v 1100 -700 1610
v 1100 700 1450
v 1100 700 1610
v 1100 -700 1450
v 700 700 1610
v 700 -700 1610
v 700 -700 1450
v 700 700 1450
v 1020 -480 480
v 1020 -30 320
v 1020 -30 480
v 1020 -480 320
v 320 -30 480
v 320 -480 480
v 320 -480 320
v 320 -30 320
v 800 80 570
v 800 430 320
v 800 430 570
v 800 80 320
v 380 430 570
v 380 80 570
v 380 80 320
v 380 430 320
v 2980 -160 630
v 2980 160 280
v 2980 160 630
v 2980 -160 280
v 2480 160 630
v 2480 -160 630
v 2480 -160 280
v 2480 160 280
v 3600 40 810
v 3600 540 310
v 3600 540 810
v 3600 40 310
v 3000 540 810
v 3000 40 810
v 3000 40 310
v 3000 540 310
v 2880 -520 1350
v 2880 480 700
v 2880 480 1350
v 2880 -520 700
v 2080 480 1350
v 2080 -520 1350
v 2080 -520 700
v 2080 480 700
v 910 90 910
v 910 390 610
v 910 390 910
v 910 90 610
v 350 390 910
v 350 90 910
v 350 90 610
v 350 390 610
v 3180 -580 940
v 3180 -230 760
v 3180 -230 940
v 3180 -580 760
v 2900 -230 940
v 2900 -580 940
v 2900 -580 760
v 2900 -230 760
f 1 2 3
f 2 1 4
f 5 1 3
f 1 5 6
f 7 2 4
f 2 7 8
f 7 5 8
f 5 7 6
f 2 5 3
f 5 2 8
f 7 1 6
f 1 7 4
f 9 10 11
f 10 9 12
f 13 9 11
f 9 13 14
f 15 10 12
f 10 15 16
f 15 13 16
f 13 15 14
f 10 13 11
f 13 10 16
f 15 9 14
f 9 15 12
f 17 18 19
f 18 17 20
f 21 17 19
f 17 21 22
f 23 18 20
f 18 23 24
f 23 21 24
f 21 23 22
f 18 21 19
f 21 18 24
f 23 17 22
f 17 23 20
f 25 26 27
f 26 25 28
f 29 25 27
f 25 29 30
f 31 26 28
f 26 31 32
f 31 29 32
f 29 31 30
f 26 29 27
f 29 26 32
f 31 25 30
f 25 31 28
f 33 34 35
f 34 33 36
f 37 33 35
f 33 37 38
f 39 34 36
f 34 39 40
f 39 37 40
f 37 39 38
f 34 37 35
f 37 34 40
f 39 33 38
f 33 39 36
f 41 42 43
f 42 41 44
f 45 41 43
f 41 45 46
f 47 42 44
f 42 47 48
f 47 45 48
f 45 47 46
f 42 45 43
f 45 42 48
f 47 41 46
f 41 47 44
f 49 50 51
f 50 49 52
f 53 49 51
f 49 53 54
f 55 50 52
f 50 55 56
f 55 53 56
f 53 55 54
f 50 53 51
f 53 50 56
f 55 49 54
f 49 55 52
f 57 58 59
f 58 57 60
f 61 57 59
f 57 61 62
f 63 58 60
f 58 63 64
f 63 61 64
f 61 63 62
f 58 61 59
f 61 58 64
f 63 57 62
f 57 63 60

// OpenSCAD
// Target alternative envelopes for ZAZ, NOT original VW geometry; mm.
color([0.2196078431372549, 0.7411764705882353, 0.9725490196078431]) translate([700, -700, 1450]) cube([400, 1400, 160]);
color([0.1450980392156863, 0.38823529411764707, 0.9215686274509803]) translate([320, -480, 320]) cube([700, 450, 160]);
color([0.6549019607843137, 0.5450980392156862, 0.9803921568627451]) translate([380, 80, 320]) cube([420, 350, 250]);
color([0.5803921568627451, 0.6392156862745098, 0.7215686274509804]) translate([2480, -160, 280]) cube([500, 320, 350]);
color([0.984313725490196, 0.5725490196078431, 0.23529411764705882]) translate([3000, 40, 310]) cube([600, 500, 500]);
color([0.9372549019607843, 0.26666666666666666, 0.26666666666666666]) translate([2080, -520, 700]) cube([800, 1000, 650]);
color([0.9176470588235294, 0.7019607843137254, 0.03137254901960784]) translate([350, 90, 610]) cube([560, 300, 300]);
color([0.0784313725490196, 0.7215686274509804, 0.6509803921568628]) translate([2900, -580, 760]) cube([280, 350, 180]);
